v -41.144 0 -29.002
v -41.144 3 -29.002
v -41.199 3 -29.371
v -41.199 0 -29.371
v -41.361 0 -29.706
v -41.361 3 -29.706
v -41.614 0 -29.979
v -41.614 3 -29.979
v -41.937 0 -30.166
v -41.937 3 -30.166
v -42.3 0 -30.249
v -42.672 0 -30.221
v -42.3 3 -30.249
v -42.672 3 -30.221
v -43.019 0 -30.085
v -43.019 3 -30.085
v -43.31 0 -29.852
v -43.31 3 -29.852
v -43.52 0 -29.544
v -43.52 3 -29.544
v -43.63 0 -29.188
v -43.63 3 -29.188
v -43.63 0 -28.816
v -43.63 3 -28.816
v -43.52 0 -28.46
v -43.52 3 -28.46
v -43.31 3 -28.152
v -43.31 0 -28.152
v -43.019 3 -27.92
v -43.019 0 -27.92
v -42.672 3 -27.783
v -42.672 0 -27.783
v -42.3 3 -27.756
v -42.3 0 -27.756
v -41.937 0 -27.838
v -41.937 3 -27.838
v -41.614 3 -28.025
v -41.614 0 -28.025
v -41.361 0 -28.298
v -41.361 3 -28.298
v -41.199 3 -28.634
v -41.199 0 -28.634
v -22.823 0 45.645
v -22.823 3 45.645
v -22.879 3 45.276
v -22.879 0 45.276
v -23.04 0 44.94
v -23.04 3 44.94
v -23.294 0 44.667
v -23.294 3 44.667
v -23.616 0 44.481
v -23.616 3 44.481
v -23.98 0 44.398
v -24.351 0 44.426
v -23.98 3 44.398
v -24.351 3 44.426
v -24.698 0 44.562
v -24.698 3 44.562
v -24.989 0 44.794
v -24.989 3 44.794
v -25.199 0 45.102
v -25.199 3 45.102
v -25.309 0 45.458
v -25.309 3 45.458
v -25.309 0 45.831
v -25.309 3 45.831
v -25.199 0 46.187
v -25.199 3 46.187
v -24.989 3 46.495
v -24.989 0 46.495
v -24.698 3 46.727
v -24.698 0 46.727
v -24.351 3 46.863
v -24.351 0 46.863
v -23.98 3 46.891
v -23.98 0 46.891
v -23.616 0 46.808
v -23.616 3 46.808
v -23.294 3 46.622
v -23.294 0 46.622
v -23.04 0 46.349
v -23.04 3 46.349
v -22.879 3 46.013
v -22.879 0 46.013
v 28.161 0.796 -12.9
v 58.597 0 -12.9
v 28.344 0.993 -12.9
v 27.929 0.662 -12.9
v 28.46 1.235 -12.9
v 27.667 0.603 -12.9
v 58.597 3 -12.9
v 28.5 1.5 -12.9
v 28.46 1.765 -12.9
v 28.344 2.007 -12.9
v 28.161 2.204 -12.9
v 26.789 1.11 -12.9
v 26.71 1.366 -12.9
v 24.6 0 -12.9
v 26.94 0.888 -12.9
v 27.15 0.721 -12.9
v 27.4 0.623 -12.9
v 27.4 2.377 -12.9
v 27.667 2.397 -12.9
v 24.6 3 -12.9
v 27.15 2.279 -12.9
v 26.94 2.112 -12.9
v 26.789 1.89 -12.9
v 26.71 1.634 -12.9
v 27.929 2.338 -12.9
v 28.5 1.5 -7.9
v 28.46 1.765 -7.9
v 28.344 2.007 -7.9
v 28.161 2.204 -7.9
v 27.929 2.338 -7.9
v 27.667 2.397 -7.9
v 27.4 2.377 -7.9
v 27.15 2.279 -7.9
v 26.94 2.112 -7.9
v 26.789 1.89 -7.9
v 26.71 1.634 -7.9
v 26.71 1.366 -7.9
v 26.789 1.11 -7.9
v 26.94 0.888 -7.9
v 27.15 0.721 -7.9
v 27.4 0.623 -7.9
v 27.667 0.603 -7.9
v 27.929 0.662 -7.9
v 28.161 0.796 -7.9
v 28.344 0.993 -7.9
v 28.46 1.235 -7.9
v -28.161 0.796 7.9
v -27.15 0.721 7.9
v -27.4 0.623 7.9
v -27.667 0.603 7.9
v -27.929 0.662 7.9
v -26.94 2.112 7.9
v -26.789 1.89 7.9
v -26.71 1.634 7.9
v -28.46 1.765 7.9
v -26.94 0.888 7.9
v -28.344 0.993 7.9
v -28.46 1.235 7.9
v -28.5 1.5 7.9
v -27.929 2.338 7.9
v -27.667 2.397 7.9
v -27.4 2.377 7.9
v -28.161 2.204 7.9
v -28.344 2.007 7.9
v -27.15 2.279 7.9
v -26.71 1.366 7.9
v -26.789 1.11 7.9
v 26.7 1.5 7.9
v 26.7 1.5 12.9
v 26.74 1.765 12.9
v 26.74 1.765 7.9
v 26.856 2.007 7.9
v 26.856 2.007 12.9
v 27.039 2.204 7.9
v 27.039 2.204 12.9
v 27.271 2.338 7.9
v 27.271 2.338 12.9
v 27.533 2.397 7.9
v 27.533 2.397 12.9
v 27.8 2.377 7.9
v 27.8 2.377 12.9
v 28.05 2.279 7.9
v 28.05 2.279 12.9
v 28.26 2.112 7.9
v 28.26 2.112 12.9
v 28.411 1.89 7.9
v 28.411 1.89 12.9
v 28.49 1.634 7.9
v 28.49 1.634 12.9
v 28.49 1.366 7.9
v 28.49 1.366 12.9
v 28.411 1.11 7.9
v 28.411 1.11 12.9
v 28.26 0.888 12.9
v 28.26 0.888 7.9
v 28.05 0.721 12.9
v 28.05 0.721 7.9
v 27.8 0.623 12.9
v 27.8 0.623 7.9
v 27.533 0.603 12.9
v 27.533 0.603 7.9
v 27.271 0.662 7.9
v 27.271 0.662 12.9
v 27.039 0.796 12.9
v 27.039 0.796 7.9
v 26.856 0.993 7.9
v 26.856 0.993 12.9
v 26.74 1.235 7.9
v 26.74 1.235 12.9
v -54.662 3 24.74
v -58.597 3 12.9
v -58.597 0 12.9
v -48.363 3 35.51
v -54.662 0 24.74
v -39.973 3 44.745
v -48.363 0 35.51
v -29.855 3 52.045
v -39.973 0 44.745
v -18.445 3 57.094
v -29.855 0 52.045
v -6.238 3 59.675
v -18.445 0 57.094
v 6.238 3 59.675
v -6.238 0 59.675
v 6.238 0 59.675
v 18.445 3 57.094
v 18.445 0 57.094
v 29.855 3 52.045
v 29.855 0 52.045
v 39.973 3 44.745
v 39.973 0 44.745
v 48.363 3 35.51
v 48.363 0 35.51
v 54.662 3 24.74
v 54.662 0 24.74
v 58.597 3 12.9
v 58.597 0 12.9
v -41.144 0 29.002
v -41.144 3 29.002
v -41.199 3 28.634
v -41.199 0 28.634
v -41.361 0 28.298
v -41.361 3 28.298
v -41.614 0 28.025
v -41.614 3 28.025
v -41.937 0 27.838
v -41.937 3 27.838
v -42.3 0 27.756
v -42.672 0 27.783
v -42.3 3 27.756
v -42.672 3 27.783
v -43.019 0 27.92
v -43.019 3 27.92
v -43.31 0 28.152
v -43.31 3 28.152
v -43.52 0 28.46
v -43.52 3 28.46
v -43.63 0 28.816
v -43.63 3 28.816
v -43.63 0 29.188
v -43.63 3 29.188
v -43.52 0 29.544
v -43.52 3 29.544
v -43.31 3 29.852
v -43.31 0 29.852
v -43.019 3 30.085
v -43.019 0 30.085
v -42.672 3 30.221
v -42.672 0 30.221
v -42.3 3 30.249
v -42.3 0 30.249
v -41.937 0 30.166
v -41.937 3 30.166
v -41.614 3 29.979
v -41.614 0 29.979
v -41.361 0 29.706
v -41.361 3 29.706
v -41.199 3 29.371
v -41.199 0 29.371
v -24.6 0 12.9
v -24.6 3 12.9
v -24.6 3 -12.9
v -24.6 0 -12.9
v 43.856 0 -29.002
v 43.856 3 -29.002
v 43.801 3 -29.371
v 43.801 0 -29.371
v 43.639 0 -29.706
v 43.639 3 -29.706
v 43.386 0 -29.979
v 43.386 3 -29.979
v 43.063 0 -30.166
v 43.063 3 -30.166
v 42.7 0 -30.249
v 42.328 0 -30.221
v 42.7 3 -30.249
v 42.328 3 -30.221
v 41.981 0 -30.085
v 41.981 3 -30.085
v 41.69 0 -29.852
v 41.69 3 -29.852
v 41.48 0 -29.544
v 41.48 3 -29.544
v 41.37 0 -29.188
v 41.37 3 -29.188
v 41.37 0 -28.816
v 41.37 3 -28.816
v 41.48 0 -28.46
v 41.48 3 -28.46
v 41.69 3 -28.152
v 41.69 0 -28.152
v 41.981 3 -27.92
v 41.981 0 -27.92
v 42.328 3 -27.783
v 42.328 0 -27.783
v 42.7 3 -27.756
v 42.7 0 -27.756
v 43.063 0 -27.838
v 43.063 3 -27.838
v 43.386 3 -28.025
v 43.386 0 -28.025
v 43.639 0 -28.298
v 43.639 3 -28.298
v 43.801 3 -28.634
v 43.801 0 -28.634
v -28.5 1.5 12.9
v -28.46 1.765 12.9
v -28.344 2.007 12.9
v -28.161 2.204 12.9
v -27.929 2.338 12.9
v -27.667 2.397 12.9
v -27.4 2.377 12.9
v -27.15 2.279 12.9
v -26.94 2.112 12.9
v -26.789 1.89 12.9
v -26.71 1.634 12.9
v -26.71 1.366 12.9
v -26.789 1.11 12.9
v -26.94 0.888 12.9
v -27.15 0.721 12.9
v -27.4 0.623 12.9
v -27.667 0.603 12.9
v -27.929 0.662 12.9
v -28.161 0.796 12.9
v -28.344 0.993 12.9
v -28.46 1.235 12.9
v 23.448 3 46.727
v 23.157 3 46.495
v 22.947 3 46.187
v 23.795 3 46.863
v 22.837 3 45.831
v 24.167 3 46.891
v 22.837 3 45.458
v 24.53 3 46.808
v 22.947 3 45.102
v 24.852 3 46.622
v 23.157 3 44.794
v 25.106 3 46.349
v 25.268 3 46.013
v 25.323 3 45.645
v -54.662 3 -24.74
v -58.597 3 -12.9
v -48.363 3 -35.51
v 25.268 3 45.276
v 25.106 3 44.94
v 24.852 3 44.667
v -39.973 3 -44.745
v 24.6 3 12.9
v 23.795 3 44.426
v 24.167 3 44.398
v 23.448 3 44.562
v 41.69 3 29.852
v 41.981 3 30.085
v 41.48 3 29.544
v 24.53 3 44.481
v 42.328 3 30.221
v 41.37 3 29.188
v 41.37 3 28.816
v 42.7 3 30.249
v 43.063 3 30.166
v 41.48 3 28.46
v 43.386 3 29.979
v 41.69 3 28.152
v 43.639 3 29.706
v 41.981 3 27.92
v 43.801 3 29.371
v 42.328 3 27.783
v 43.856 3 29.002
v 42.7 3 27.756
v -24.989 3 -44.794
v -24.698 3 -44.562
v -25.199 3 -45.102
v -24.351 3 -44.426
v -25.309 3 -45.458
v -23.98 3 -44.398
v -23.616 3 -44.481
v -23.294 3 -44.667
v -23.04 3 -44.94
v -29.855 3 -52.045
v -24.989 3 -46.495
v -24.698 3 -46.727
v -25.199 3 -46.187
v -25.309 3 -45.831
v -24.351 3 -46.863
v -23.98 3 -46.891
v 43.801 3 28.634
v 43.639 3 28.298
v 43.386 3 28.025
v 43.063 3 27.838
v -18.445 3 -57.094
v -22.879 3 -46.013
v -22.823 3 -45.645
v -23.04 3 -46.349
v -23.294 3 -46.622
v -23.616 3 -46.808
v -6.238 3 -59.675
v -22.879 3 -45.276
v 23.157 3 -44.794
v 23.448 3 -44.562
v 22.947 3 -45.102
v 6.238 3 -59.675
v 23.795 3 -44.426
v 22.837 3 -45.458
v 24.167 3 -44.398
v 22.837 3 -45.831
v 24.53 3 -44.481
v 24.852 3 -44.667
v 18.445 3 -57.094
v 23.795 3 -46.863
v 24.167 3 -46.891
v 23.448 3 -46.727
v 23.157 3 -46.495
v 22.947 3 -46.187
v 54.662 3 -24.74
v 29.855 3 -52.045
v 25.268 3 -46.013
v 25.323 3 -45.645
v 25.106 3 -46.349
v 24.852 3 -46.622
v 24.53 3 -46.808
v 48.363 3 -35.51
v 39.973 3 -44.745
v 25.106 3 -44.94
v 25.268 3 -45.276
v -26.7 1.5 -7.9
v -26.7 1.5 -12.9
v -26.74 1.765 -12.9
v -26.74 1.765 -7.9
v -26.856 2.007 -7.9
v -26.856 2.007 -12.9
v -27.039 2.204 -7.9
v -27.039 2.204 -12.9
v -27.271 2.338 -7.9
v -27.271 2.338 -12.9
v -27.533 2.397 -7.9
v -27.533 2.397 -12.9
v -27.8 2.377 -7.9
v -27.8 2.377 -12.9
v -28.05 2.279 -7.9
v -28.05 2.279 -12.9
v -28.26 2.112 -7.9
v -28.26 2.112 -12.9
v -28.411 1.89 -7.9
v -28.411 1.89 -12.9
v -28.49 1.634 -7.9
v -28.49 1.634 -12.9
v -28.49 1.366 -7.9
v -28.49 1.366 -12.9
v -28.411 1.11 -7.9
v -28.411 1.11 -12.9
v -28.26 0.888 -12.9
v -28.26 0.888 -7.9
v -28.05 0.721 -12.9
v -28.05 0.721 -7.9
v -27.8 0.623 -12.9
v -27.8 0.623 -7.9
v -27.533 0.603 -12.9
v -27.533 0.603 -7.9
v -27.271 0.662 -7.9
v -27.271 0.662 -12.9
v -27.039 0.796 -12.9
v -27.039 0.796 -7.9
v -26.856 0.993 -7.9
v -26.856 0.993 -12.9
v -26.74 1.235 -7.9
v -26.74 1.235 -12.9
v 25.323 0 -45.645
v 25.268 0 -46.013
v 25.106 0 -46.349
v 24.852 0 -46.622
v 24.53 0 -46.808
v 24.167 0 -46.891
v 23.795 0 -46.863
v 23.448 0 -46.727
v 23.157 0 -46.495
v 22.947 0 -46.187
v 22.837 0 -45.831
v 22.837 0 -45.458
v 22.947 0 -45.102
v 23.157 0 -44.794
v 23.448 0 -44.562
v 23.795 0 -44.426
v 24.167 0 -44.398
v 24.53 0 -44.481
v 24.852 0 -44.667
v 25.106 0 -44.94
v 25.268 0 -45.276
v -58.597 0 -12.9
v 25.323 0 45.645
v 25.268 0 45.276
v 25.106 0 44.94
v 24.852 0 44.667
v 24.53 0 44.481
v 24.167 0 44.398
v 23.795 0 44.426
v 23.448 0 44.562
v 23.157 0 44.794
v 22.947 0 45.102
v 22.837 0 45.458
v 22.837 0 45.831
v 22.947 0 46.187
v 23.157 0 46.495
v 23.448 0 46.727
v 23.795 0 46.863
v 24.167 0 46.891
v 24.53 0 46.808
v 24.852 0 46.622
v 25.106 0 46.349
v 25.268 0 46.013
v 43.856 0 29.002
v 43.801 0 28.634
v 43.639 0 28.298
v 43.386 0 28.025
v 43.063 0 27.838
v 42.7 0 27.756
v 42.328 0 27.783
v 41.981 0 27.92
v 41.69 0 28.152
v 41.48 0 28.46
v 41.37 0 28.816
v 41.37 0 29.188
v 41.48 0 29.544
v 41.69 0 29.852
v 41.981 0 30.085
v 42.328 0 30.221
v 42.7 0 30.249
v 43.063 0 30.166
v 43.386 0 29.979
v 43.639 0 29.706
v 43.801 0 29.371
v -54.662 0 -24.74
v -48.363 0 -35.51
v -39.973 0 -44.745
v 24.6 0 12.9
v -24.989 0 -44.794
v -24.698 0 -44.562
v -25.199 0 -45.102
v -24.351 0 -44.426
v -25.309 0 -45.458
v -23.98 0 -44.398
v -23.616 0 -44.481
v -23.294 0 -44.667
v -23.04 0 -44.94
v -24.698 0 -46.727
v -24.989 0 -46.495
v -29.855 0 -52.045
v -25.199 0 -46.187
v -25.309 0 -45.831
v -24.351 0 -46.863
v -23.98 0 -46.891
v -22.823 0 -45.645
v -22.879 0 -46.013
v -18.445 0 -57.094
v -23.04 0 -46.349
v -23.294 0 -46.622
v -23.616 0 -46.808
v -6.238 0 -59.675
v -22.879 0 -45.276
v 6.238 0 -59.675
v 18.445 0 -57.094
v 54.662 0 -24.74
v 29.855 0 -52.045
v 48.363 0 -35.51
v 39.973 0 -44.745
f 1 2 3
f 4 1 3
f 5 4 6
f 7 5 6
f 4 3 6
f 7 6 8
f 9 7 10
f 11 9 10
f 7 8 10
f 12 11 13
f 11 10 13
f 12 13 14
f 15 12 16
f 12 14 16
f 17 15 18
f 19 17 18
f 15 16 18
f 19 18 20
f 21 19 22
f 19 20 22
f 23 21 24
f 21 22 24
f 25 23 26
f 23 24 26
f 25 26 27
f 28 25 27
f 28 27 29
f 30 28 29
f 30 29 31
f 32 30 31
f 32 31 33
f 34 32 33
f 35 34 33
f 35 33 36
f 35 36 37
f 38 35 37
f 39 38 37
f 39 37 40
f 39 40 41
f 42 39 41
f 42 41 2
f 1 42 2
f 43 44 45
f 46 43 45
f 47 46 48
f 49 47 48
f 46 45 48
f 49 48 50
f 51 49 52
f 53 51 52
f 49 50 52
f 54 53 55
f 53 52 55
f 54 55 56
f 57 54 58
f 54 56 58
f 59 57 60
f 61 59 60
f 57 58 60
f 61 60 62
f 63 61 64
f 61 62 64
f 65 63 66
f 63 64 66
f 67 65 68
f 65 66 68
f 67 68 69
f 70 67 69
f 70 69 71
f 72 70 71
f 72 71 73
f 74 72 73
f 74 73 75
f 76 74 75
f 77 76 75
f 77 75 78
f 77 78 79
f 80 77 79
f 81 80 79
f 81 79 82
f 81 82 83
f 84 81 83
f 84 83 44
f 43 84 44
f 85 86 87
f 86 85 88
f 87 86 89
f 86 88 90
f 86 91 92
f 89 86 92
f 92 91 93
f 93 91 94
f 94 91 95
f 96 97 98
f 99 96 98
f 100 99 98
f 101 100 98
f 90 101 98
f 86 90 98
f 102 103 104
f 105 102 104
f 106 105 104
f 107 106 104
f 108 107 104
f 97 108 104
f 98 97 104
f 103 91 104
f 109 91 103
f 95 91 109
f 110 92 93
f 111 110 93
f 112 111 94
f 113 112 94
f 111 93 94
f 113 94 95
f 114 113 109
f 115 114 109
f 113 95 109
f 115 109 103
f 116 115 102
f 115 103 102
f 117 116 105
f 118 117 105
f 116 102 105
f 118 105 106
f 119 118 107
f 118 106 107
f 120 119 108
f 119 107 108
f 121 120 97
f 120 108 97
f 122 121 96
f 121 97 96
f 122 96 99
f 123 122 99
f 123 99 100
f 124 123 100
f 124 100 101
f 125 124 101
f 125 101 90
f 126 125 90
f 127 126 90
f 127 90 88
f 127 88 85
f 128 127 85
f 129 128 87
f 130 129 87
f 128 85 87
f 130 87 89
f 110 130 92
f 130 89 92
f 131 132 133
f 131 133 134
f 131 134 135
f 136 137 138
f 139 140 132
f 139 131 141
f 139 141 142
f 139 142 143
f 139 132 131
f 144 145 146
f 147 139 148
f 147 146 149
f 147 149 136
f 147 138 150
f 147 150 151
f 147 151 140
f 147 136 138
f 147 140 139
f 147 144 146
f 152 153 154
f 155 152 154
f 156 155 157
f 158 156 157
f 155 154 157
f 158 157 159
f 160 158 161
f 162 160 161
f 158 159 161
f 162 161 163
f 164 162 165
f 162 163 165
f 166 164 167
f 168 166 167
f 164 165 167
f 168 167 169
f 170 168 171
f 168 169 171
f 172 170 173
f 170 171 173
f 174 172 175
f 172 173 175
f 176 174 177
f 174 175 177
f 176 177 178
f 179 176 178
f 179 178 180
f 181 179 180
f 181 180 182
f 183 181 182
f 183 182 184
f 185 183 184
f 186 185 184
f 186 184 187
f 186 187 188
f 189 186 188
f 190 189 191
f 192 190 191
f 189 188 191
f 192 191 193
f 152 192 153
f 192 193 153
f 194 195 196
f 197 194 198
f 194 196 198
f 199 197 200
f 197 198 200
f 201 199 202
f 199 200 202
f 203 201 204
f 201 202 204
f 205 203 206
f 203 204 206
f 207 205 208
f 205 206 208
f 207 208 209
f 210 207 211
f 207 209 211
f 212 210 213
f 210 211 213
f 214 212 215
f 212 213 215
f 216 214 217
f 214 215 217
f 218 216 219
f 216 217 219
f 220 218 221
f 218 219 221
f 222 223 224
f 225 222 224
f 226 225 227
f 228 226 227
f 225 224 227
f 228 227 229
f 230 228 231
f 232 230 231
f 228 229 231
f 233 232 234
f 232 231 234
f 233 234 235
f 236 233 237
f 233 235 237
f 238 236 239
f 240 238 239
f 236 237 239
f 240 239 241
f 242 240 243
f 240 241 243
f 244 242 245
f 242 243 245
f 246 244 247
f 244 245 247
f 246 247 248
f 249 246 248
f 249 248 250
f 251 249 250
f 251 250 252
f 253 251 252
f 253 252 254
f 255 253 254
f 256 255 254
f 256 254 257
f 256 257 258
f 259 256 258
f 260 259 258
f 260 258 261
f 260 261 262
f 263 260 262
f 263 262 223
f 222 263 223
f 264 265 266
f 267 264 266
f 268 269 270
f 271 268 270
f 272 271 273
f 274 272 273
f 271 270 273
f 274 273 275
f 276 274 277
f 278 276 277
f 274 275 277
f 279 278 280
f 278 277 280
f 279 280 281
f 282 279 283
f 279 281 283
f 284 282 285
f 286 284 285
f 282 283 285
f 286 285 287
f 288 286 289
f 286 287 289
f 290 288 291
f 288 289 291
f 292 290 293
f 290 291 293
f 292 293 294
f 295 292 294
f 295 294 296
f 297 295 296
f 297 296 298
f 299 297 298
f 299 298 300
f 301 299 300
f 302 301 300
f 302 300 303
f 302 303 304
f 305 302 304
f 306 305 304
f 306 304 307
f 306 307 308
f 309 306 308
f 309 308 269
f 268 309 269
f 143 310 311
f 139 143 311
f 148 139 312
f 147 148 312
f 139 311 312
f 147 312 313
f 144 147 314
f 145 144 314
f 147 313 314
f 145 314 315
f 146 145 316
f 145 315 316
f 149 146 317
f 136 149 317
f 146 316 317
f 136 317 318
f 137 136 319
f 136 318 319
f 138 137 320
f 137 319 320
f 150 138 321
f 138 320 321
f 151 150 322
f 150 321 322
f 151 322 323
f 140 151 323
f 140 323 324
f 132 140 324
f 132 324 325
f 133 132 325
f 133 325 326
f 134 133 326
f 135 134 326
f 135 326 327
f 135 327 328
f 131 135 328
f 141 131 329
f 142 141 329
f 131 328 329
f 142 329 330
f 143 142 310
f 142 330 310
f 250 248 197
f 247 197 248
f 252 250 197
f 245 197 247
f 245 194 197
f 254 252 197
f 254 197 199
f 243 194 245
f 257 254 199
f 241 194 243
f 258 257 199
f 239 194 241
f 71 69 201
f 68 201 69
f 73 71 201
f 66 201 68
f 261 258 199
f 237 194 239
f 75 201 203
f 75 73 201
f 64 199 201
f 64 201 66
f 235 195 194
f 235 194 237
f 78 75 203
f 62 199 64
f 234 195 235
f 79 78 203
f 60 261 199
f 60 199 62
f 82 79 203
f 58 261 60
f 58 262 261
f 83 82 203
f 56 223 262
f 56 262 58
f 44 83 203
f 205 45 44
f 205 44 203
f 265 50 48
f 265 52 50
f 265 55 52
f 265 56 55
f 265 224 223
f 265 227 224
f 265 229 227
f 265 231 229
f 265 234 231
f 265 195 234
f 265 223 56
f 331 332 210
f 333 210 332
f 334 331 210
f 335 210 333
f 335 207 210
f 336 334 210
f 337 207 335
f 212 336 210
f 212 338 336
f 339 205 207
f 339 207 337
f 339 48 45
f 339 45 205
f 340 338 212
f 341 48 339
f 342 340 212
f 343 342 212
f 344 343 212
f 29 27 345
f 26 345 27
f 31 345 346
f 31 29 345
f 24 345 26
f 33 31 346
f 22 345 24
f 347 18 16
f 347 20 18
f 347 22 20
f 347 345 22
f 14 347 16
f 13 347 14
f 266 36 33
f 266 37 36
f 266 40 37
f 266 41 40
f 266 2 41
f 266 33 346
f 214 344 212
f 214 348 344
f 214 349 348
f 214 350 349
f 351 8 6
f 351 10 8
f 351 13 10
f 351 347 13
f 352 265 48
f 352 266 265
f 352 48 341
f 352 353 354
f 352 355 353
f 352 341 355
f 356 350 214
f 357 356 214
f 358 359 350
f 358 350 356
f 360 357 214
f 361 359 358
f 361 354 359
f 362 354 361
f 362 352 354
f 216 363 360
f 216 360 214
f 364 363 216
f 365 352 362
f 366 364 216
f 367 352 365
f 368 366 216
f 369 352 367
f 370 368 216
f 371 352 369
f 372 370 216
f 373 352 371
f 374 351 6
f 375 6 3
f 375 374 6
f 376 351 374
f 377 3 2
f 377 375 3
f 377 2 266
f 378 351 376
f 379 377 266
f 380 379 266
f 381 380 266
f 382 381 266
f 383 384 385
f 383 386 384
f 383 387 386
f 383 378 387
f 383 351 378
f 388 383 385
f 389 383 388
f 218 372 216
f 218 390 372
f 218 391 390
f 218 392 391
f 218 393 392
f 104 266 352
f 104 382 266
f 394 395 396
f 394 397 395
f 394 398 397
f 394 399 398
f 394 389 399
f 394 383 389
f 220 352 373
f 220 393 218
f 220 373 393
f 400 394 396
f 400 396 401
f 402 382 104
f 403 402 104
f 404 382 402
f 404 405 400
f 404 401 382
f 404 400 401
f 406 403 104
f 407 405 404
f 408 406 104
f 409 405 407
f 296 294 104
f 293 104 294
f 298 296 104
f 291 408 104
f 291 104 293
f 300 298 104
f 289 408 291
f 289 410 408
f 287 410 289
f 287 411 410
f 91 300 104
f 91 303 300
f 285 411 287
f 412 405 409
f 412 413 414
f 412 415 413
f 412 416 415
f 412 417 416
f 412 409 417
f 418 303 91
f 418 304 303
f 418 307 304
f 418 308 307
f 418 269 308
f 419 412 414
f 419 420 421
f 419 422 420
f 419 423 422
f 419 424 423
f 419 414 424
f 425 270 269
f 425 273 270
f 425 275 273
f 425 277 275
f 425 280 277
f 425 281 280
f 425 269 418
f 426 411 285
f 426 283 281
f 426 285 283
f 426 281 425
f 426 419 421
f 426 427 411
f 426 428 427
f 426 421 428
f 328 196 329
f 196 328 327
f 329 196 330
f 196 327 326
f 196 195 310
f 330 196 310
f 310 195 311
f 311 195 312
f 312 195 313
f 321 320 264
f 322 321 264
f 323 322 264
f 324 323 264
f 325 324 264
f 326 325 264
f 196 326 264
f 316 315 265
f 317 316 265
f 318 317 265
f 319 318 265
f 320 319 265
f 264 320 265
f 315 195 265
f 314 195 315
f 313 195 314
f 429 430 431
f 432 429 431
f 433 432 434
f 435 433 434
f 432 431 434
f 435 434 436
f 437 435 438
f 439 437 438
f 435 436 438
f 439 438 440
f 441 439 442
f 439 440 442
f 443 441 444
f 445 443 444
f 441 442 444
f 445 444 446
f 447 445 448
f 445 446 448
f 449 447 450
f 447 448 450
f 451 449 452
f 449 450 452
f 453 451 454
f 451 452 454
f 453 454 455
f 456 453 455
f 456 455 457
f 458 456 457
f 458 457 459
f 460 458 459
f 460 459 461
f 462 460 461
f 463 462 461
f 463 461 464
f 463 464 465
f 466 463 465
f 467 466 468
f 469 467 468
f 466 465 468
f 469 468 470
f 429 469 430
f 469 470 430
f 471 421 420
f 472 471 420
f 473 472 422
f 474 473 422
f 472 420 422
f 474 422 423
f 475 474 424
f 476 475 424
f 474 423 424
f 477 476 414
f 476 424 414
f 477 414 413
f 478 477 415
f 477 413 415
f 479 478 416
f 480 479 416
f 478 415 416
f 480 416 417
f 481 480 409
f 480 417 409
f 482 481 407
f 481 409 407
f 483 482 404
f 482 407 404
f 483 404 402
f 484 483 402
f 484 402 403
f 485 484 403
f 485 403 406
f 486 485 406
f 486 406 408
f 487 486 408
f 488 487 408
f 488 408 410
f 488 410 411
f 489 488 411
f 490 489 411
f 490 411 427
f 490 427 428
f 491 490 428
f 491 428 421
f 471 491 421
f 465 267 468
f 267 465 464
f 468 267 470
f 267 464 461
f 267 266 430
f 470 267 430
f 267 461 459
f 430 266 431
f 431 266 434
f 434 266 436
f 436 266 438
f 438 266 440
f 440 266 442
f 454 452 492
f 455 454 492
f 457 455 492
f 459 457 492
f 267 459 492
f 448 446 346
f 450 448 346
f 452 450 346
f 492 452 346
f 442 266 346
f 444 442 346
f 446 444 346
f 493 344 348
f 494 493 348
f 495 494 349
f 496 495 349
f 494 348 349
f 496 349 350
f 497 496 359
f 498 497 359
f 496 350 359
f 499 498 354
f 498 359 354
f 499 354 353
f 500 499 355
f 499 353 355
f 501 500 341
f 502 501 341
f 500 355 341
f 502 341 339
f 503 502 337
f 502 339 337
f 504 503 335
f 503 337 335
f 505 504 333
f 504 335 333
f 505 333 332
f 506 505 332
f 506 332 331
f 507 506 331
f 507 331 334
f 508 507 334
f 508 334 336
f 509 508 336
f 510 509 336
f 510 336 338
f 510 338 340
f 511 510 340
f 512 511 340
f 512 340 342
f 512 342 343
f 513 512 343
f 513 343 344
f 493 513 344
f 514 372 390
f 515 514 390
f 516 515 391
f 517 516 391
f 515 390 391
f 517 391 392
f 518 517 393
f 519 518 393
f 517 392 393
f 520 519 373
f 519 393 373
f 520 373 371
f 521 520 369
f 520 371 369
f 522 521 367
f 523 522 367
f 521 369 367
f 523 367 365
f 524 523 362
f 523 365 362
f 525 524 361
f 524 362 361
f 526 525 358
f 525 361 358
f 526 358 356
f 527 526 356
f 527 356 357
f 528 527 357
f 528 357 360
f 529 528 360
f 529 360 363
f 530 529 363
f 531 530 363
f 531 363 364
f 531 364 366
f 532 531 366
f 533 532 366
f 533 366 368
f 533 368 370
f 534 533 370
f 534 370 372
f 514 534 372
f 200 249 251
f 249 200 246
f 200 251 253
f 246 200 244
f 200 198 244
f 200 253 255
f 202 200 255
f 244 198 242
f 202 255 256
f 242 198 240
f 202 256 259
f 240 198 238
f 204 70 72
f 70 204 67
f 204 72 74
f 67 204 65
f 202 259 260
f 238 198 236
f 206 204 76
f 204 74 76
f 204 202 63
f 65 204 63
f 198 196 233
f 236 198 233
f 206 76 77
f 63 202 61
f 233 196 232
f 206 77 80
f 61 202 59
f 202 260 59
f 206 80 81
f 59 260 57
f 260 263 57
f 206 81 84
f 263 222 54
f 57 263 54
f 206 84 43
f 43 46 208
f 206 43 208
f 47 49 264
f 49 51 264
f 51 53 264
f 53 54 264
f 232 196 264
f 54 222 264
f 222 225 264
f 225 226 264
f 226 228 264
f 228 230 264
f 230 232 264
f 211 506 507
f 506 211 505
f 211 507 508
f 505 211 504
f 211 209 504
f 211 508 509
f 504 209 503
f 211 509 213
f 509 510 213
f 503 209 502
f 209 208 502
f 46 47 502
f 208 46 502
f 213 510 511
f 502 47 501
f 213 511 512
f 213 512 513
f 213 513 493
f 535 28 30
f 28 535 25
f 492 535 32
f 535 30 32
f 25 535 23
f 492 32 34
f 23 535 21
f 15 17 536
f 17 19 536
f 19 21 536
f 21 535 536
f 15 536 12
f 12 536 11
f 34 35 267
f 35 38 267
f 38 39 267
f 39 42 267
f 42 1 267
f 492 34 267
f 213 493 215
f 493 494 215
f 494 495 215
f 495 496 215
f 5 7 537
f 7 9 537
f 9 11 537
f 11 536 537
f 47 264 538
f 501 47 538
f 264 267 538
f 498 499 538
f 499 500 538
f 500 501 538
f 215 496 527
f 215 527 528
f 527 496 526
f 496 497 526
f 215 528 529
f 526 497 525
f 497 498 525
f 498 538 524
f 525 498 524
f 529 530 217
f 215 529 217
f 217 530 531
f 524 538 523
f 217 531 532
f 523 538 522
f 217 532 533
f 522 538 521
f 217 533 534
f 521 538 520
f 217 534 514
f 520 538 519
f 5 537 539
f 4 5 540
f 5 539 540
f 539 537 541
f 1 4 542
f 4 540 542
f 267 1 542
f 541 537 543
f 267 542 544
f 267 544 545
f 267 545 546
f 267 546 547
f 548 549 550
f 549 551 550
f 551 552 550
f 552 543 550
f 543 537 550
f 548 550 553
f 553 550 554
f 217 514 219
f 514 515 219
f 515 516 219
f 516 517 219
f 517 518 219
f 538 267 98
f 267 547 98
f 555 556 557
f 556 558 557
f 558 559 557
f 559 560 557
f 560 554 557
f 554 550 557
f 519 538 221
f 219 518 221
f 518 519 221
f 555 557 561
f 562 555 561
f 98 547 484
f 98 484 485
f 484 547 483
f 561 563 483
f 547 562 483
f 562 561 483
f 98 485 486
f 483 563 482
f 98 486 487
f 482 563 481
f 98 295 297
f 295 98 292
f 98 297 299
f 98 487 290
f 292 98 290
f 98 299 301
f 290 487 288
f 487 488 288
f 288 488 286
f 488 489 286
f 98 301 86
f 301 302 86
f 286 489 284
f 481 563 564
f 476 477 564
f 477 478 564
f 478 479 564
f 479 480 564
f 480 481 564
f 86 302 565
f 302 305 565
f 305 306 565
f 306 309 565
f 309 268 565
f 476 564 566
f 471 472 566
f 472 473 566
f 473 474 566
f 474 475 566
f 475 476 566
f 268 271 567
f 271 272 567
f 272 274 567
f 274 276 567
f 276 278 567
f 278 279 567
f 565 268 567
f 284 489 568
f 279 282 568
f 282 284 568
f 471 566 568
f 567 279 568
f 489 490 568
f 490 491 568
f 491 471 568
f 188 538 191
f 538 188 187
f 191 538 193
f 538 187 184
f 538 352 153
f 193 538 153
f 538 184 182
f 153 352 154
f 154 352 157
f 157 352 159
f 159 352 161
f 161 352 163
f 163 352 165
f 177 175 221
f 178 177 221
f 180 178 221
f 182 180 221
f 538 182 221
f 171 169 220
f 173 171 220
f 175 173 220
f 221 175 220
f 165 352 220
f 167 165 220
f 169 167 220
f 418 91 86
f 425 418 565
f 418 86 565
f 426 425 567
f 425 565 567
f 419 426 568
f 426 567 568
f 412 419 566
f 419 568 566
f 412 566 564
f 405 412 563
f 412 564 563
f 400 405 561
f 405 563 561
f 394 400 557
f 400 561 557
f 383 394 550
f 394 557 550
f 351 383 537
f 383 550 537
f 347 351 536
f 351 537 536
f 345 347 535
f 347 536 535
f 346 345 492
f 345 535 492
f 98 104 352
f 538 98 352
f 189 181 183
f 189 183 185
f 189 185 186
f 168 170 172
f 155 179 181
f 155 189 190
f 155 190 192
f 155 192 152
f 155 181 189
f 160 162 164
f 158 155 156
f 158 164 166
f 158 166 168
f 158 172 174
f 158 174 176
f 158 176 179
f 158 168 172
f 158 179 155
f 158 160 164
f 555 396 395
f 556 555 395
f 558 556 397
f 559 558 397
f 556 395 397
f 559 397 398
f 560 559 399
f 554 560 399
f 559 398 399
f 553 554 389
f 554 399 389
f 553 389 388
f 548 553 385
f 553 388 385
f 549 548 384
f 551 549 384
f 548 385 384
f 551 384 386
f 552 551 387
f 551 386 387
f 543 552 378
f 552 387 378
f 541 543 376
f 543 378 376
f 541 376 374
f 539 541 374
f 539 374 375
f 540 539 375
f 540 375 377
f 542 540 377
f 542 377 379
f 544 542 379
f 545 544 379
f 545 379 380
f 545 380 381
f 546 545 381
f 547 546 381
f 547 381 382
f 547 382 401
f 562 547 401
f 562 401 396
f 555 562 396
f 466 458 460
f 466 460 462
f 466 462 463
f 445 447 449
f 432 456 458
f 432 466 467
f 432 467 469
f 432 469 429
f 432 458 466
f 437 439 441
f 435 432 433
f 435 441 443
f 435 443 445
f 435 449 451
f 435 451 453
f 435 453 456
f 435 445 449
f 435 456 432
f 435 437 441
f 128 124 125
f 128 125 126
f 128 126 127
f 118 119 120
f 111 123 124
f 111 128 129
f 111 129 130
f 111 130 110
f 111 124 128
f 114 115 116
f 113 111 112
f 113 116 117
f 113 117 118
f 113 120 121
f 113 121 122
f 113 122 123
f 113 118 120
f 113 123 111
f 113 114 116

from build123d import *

# Parameters (mm, degrees)
SKETCH1_R           = 60
BOSS_EXTRUDE1_DEPTH = 3
SKETCH2_R           = 1.25
CUT_EXTRUDE1_DEPTH  = 4
CUT_EXTRUDE9_DEPTH  = 4
SKETCH5_R           = 0.9
BOSS_EXTRUDE2_DEPTH = 5
SKETCH7_R           = 0.9
BOSS_EXTRUDE3_DEPTH = 5
SKETCH8_R           = 0.9
BOSS_EXTRUDE4_DEPTH = 5
SKETCH9_R           = 0.9
BOSS_EXTRUDE5_DEPTH = 5


with BuildPart() as part:
    # Sketch1 → Boss-Extrude1 (new body)
    with BuildSketch(Plane(origin=(0, 0, 0), x_dir=(1, 0, 0), z_dir=(0, 1, 0))):
        Circle(SKETCH1_R)
    extrude(amount=BOSS_EXTRUDE1_DEPTH)

    # Sketch2 → Cut-Extrude1 (cut, through all)
    with BuildSketch(Plane(origin=(0, 3, 0), x_dir=(1, 0, 0), z_dir=(0, 1, 0))):
        with Locations((-42.393550358, 29.002085895)):
            Circle(SKETCH2_R)
        with Locations((42.606449642, 29.002085895)):
            Circle(SKETCH2_R)
        with Locations((42.606449642, -29.002085895)):
            Circle(SKETCH2_R)
        with Locations((-42.393550358, -29.002085895)):
            Circle(SKETCH2_R)
        with Locations((-24.073102507, 45.644631202)):
            Circle(SKETCH2_R)
        with Locations((24.073102507, 45.644631202)):
            Circle(SKETCH2_R)
        with Locations((24.073102507, -45.644631202)):
            Circle(SKETCH2_R)
        with Locations((-24.073102507, -45.644631202)):
            Circle(SKETCH2_R)
    extrude(amount=-CUT_EXTRUDE1_DEPTH, mode=Mode.SUBTRACT)

    # Sketch4 → Cut-Extrude9 (cut, through all)
    with BuildSketch(Plane(origin=(0, 3, 0), x_dir=(1, 0, 0), z_dir=(0, 1, 0))):
        with BuildLine():
            Line((-24.6, 12.9), (-58.596842918, 12.9))
            ThreePointArc((-58.596842918, 12.9), (-60, 0), (-58.596842918, -12.9))
            Line((-58.596842918, -12.9), (-24.6, -12.9))
            Line((-24.6, -12.9), (-24.6, 12.9))
        make_face()
        with BuildLine():
            Line((58.596842918, 12.9), (24.6, 12.9))
            Line((24.6, 12.9), (24.6, 0))
            Line((24.6, 0), (60, 0))
            ThreePointArc((60, 0), (59.648179248, 6.488043808), (58.596842918, 12.9))
        make_face()
        with BuildLine():
            Line((60, 0), (24.6, 0))
            Line((24.6, 0), (24.6, -12.9))
            Line((24.6, -12.9), (58.596842918, -12.9))
            ThreePointArc((58.596842918, -12.9), (59.648179248, -6.488043808), (60, 0))
        make_face()
    extrude(amount=-CUT_EXTRUDE9_DEPTH, mode=Mode.SUBTRACT)

    # Sketch5 → Boss-Extrude2 (add)
    with BuildSketch(Plane.XY.offset(-12.9)):
        with Locations((27.6, 1.5)):
            Circle(SKETCH5_R)
    extrude(amount=BOSS_EXTRUDE2_DEPTH)

    # Sketch7 → Boss-Extrude3 (add)
    with BuildSketch(Plane(origin=(0, 0, 12.9), x_dir=(-1, 0, 0), z_dir=(0, 0, -1))):
        with Locations((-27.6, 1.5)):
            Circle(SKETCH7_R)
    extrude(amount=BOSS_EXTRUDE3_DEPTH)

    # Sketch8 → Boss-Extrude4 (add)
    with BuildSketch(Plane.XY.offset(-12.9)):
        with Locations((-27.6, 1.5)):
            Circle(SKETCH8_R)
    extrude(amount=BOSS_EXTRUDE4_DEPTH)

    # Sketch9 → Boss-Extrude5 (add)
    with BuildSketch(Plane(origin=(0, 0, 12.9), x_dir=(-1, 0, 0), z_dir=(0, 0, -1))):
        with Locations((27.6, 1.5)):
            Circle(SKETCH9_R)
    extrude(amount=BOSS_EXTRUDE5_DEPTH)


solid = part.part
